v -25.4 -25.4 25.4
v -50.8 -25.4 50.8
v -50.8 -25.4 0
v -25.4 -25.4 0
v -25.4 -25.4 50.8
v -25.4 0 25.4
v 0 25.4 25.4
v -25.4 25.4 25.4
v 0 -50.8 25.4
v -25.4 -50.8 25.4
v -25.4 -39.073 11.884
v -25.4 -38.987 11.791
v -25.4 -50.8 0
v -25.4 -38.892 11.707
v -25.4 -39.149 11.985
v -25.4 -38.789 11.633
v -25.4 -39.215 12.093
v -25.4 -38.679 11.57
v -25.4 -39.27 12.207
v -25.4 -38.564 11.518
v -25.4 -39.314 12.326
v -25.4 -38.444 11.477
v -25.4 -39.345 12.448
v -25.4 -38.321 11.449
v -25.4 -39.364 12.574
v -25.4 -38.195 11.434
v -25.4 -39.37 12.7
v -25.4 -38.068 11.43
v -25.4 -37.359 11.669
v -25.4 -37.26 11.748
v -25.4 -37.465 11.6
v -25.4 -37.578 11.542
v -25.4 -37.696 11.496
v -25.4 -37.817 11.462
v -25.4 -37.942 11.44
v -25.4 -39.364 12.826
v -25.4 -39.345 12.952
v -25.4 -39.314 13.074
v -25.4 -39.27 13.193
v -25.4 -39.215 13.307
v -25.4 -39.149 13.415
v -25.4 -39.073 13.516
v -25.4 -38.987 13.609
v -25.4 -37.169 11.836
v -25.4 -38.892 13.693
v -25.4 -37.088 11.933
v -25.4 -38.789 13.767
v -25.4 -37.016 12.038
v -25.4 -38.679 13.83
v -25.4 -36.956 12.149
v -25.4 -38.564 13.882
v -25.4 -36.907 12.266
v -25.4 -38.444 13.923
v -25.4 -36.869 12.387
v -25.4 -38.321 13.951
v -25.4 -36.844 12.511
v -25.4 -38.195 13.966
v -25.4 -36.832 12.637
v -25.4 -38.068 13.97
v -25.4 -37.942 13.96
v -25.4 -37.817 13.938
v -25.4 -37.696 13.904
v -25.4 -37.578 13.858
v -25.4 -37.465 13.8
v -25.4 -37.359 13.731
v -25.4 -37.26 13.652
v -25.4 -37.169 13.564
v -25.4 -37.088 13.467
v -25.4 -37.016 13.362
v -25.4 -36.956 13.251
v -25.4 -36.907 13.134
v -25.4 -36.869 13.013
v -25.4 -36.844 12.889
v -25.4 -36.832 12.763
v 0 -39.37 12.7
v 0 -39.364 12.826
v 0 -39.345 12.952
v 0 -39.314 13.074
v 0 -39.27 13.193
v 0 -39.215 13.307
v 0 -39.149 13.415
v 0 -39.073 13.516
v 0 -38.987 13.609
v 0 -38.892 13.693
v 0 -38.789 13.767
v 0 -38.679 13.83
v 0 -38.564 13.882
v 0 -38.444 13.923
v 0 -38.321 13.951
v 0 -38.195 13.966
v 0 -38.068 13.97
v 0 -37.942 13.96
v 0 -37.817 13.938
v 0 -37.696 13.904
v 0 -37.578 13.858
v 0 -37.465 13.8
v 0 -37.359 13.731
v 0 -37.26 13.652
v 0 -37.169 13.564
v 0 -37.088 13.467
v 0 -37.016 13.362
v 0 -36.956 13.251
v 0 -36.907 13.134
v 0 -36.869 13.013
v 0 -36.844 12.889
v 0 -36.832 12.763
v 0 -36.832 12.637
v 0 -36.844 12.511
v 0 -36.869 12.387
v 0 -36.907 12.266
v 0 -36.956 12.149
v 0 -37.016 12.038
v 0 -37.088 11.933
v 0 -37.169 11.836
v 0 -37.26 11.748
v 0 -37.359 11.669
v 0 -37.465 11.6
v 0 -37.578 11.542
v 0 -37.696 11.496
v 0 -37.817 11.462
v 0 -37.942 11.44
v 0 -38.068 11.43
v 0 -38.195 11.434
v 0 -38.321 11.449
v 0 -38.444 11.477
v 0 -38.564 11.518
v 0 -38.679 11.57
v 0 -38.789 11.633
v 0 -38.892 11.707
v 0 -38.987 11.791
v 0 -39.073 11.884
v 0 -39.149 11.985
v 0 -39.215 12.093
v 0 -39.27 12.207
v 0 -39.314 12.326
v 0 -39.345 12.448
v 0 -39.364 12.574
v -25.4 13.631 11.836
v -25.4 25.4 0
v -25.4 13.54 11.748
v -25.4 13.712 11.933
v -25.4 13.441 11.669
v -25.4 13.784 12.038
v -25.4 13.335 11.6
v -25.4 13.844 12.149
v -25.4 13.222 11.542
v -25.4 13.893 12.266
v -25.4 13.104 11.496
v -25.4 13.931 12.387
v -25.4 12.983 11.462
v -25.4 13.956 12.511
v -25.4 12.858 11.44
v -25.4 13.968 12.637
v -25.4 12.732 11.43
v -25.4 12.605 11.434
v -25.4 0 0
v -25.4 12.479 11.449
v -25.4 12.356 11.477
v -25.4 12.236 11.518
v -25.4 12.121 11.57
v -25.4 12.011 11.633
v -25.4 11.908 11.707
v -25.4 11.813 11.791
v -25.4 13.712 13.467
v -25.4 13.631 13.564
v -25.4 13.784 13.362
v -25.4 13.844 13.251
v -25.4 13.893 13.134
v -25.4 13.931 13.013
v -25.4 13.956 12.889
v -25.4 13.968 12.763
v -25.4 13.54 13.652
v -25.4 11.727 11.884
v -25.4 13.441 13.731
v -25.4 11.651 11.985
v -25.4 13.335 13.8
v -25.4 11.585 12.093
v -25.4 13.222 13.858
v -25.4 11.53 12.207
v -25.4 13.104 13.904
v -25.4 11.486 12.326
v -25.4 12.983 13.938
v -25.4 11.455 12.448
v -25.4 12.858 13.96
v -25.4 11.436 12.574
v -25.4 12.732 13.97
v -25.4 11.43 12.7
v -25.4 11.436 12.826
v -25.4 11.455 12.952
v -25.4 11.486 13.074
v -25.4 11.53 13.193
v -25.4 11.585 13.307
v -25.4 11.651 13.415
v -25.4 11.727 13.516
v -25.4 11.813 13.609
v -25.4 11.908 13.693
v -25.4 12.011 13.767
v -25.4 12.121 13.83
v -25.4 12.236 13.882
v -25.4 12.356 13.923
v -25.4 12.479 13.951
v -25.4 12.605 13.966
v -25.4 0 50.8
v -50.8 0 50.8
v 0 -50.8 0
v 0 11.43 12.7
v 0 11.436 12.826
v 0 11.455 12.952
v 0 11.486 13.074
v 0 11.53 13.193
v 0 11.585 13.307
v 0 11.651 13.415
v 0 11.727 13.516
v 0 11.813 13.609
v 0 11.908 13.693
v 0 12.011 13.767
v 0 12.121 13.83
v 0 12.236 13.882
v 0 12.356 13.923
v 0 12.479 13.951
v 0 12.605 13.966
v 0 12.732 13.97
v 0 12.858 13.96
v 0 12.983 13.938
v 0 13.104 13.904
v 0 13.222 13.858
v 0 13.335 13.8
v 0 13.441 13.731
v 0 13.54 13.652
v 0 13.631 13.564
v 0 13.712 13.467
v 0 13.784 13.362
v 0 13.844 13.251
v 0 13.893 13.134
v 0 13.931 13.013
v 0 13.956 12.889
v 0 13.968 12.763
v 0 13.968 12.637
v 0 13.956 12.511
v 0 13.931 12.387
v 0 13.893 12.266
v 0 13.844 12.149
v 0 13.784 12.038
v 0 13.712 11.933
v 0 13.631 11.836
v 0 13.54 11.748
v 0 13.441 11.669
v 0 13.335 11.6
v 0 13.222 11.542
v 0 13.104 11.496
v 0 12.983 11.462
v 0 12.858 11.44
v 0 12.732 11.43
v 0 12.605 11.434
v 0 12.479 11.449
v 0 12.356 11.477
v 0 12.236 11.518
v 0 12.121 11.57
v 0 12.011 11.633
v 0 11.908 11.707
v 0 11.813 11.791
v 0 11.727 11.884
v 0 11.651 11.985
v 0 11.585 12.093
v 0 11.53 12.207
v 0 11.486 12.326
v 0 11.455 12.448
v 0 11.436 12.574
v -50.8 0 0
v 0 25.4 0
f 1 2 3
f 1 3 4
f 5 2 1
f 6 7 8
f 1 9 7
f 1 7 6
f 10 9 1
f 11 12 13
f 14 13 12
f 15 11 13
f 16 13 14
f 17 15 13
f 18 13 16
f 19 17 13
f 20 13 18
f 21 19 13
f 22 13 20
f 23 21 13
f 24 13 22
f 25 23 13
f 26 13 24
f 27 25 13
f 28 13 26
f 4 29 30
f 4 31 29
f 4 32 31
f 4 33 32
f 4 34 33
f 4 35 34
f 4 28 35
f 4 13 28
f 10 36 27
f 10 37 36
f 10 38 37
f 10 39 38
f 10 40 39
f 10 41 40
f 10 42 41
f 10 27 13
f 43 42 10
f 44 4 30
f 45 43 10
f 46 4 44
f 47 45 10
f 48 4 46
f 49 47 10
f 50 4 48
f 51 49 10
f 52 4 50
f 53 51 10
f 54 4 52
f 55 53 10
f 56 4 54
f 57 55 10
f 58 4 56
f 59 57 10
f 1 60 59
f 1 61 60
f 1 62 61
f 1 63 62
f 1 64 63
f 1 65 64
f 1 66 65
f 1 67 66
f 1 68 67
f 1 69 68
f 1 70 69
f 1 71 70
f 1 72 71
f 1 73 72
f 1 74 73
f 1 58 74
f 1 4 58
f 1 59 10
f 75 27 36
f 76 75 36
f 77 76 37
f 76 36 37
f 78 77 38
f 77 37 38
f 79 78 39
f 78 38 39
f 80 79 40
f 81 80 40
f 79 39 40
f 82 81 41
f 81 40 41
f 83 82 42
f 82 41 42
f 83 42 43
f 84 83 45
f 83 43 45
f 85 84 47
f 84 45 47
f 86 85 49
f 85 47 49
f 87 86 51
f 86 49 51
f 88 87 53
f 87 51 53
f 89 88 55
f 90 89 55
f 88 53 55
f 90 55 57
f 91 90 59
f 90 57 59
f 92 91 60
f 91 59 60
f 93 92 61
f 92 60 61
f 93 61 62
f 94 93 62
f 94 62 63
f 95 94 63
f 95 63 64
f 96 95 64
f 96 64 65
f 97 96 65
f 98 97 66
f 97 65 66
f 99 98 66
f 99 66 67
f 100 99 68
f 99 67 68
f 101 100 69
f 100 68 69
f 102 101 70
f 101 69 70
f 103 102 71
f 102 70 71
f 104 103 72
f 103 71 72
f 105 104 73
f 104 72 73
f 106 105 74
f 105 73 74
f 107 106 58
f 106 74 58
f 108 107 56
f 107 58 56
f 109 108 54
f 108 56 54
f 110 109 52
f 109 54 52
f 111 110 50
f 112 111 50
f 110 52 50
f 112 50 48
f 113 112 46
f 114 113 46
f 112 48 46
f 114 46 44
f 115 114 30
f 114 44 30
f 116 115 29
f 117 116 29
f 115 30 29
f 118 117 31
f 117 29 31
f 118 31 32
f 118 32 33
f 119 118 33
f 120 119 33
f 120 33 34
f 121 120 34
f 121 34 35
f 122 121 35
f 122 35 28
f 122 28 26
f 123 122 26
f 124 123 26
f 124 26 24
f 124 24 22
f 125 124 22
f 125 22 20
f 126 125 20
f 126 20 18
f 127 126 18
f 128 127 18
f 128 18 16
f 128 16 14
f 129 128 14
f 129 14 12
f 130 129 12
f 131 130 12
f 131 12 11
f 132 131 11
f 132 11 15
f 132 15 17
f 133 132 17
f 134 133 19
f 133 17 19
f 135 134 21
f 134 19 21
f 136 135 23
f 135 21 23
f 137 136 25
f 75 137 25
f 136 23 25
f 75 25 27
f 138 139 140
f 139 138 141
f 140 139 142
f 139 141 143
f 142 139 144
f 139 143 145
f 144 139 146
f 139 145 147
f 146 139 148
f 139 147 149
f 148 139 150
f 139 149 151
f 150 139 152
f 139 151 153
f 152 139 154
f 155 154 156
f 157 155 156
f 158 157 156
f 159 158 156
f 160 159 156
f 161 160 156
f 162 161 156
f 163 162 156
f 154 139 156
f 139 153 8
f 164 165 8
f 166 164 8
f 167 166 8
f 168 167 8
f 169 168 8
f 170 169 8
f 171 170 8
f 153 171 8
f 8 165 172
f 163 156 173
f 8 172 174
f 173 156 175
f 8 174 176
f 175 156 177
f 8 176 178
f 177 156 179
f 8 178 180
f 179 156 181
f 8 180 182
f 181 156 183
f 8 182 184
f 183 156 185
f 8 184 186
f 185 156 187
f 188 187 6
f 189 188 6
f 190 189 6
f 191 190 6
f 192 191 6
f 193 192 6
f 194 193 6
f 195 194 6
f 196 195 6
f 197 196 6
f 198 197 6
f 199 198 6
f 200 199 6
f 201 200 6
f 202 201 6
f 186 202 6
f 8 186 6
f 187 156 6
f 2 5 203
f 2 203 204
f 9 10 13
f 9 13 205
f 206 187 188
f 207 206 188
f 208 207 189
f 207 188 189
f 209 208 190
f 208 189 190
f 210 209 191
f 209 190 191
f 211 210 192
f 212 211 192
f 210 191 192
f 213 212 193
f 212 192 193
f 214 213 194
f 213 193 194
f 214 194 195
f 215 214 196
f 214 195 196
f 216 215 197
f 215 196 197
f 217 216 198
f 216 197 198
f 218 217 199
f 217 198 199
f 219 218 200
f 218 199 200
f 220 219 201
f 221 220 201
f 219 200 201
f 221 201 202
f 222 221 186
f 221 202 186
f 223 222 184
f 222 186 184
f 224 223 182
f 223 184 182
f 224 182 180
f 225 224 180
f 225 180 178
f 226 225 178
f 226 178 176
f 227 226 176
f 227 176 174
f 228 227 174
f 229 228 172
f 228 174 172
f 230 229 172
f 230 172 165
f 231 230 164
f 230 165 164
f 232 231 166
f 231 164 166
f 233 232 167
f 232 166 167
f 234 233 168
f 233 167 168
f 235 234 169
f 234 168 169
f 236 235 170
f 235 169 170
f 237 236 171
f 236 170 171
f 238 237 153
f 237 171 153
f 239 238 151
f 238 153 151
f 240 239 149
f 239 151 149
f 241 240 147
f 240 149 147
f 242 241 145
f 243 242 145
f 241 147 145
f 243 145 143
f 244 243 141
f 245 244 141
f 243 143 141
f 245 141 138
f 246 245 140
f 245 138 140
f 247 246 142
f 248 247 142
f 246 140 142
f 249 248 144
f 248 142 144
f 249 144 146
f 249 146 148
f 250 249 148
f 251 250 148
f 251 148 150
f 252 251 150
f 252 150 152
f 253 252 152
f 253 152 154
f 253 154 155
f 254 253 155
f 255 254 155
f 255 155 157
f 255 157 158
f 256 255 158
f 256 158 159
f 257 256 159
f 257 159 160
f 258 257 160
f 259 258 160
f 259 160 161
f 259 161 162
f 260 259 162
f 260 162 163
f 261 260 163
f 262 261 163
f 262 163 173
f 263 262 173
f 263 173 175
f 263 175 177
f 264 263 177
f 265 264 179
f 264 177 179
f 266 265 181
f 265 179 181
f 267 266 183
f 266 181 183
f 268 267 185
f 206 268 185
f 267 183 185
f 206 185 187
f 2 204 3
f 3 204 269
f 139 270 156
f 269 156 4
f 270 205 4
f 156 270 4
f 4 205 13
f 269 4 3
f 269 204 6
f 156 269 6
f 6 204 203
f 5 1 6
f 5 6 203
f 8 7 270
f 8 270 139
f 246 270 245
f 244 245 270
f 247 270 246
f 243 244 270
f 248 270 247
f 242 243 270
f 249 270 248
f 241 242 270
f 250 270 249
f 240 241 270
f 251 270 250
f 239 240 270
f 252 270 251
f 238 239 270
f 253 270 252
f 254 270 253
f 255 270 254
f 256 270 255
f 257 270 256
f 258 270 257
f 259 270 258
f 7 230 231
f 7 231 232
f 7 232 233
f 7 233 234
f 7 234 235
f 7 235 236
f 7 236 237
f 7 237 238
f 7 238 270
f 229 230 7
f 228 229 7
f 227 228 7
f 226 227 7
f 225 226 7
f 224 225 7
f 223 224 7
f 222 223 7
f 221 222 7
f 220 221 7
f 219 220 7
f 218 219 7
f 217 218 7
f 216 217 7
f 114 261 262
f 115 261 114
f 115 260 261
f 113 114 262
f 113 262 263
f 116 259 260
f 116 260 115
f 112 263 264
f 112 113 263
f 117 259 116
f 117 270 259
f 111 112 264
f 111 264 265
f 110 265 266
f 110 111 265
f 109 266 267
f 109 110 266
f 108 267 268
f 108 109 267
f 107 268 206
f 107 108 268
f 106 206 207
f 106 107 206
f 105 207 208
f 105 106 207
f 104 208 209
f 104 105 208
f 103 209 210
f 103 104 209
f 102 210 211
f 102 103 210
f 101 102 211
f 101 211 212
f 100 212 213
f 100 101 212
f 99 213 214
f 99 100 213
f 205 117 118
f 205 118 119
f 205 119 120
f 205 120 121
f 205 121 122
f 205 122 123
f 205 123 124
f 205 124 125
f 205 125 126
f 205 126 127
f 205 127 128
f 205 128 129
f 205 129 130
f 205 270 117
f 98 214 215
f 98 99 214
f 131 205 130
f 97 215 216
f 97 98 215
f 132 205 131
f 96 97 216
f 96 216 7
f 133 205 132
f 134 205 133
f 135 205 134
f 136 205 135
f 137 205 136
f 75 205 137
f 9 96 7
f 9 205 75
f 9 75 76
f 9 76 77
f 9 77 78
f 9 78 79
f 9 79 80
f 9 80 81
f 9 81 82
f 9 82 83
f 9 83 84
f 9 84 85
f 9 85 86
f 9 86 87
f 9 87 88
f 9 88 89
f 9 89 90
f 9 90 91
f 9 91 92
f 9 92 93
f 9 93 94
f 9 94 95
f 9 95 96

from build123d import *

# Parameters (mm, degrees)
F0_W     = 25.4
F0_H     = 25.4
F1_DEPTH = 25.4
F2_W     = 25.4
F2_H     = 25.4
F3_DEPTH = 25.4
F4_W     = 25.4
F4_H     = 25.4
F5_DEPTH = 25.4
F7_R     = 1.27
F6_R     = 1.27
F8_DEPTH = 25.4


with BuildPart() as f1:
    # F0 (on Front) → F1 (new body)
    with BuildSketch(Plane.XZ):
        Polygon((-50.8, 0), (-25.4, 0), (-25.4, 25.4), (-25.4, 50.8), (-50.8, 50.8), align=None)
        with Locations((-12.7, 12.7)):
            Rectangle(F0_W, F0_H)
    extrude(amount=F1_DEPTH)

    # F2 (on face) → F3 (join)
    with BuildSketch(Plane.XZ.offset(25.4)):
        with Locations((-12.7, 12.7)):
            Rectangle(F2_W, F2_H)
    extrude(amount=F3_DEPTH)

    # F4 (on face) → F5 (join)
    with BuildSketch(Plane(origin=(0, 0, 0), x_dir=(-1, 0, 0), z_dir=(0, 1, 0))):
        with Locations((12.7, 12.7)):
            Rectangle(F4_W, F4_H)
    extrude(amount=F5_DEPTH)

    # F7 (on face) + F6 (on face) → F8 (cut)
    with BuildSketch(Plane(origin=(-25.4, 0, 0), x_dir=(0, -1, 0), z_dir=(-1, 0, 0))):
        with Locations((38.1, 12.7)):
            Circle(F7_R)
    with BuildSketch(Plane(origin=(-25.4, 0, 0), x_dir=(0, -1, 0), z_dir=(-1, 0, 0))):
        with Locations((-12.7, 12.7)):
            Circle(F6_R)
    extrude(amount=-F8_DEPTH, mode=Mode.SUBTRACT)


solid = f1.part
